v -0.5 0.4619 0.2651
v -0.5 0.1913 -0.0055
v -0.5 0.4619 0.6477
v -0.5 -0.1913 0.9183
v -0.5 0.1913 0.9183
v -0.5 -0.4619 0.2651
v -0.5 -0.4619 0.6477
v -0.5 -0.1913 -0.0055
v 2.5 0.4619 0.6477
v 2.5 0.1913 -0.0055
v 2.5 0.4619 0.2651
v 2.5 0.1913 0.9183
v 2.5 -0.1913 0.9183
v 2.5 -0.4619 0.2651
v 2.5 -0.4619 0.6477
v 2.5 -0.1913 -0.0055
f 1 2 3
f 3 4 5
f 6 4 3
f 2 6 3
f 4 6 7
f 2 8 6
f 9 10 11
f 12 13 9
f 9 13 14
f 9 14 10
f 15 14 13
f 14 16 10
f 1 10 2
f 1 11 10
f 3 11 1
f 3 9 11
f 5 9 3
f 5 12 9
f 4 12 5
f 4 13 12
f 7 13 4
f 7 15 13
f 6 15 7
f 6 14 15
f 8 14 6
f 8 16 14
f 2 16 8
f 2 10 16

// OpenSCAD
//Octangonal Prism for Stacks of Shapes
//by Slashee the Cow

color("Chocolate")
translate([-0.5,0,0.4564])
rotate([22.5,0,0])
rotate([0,90,0])
linear_extrude(3, false)
circle(d  = 1, $fn = 8);
